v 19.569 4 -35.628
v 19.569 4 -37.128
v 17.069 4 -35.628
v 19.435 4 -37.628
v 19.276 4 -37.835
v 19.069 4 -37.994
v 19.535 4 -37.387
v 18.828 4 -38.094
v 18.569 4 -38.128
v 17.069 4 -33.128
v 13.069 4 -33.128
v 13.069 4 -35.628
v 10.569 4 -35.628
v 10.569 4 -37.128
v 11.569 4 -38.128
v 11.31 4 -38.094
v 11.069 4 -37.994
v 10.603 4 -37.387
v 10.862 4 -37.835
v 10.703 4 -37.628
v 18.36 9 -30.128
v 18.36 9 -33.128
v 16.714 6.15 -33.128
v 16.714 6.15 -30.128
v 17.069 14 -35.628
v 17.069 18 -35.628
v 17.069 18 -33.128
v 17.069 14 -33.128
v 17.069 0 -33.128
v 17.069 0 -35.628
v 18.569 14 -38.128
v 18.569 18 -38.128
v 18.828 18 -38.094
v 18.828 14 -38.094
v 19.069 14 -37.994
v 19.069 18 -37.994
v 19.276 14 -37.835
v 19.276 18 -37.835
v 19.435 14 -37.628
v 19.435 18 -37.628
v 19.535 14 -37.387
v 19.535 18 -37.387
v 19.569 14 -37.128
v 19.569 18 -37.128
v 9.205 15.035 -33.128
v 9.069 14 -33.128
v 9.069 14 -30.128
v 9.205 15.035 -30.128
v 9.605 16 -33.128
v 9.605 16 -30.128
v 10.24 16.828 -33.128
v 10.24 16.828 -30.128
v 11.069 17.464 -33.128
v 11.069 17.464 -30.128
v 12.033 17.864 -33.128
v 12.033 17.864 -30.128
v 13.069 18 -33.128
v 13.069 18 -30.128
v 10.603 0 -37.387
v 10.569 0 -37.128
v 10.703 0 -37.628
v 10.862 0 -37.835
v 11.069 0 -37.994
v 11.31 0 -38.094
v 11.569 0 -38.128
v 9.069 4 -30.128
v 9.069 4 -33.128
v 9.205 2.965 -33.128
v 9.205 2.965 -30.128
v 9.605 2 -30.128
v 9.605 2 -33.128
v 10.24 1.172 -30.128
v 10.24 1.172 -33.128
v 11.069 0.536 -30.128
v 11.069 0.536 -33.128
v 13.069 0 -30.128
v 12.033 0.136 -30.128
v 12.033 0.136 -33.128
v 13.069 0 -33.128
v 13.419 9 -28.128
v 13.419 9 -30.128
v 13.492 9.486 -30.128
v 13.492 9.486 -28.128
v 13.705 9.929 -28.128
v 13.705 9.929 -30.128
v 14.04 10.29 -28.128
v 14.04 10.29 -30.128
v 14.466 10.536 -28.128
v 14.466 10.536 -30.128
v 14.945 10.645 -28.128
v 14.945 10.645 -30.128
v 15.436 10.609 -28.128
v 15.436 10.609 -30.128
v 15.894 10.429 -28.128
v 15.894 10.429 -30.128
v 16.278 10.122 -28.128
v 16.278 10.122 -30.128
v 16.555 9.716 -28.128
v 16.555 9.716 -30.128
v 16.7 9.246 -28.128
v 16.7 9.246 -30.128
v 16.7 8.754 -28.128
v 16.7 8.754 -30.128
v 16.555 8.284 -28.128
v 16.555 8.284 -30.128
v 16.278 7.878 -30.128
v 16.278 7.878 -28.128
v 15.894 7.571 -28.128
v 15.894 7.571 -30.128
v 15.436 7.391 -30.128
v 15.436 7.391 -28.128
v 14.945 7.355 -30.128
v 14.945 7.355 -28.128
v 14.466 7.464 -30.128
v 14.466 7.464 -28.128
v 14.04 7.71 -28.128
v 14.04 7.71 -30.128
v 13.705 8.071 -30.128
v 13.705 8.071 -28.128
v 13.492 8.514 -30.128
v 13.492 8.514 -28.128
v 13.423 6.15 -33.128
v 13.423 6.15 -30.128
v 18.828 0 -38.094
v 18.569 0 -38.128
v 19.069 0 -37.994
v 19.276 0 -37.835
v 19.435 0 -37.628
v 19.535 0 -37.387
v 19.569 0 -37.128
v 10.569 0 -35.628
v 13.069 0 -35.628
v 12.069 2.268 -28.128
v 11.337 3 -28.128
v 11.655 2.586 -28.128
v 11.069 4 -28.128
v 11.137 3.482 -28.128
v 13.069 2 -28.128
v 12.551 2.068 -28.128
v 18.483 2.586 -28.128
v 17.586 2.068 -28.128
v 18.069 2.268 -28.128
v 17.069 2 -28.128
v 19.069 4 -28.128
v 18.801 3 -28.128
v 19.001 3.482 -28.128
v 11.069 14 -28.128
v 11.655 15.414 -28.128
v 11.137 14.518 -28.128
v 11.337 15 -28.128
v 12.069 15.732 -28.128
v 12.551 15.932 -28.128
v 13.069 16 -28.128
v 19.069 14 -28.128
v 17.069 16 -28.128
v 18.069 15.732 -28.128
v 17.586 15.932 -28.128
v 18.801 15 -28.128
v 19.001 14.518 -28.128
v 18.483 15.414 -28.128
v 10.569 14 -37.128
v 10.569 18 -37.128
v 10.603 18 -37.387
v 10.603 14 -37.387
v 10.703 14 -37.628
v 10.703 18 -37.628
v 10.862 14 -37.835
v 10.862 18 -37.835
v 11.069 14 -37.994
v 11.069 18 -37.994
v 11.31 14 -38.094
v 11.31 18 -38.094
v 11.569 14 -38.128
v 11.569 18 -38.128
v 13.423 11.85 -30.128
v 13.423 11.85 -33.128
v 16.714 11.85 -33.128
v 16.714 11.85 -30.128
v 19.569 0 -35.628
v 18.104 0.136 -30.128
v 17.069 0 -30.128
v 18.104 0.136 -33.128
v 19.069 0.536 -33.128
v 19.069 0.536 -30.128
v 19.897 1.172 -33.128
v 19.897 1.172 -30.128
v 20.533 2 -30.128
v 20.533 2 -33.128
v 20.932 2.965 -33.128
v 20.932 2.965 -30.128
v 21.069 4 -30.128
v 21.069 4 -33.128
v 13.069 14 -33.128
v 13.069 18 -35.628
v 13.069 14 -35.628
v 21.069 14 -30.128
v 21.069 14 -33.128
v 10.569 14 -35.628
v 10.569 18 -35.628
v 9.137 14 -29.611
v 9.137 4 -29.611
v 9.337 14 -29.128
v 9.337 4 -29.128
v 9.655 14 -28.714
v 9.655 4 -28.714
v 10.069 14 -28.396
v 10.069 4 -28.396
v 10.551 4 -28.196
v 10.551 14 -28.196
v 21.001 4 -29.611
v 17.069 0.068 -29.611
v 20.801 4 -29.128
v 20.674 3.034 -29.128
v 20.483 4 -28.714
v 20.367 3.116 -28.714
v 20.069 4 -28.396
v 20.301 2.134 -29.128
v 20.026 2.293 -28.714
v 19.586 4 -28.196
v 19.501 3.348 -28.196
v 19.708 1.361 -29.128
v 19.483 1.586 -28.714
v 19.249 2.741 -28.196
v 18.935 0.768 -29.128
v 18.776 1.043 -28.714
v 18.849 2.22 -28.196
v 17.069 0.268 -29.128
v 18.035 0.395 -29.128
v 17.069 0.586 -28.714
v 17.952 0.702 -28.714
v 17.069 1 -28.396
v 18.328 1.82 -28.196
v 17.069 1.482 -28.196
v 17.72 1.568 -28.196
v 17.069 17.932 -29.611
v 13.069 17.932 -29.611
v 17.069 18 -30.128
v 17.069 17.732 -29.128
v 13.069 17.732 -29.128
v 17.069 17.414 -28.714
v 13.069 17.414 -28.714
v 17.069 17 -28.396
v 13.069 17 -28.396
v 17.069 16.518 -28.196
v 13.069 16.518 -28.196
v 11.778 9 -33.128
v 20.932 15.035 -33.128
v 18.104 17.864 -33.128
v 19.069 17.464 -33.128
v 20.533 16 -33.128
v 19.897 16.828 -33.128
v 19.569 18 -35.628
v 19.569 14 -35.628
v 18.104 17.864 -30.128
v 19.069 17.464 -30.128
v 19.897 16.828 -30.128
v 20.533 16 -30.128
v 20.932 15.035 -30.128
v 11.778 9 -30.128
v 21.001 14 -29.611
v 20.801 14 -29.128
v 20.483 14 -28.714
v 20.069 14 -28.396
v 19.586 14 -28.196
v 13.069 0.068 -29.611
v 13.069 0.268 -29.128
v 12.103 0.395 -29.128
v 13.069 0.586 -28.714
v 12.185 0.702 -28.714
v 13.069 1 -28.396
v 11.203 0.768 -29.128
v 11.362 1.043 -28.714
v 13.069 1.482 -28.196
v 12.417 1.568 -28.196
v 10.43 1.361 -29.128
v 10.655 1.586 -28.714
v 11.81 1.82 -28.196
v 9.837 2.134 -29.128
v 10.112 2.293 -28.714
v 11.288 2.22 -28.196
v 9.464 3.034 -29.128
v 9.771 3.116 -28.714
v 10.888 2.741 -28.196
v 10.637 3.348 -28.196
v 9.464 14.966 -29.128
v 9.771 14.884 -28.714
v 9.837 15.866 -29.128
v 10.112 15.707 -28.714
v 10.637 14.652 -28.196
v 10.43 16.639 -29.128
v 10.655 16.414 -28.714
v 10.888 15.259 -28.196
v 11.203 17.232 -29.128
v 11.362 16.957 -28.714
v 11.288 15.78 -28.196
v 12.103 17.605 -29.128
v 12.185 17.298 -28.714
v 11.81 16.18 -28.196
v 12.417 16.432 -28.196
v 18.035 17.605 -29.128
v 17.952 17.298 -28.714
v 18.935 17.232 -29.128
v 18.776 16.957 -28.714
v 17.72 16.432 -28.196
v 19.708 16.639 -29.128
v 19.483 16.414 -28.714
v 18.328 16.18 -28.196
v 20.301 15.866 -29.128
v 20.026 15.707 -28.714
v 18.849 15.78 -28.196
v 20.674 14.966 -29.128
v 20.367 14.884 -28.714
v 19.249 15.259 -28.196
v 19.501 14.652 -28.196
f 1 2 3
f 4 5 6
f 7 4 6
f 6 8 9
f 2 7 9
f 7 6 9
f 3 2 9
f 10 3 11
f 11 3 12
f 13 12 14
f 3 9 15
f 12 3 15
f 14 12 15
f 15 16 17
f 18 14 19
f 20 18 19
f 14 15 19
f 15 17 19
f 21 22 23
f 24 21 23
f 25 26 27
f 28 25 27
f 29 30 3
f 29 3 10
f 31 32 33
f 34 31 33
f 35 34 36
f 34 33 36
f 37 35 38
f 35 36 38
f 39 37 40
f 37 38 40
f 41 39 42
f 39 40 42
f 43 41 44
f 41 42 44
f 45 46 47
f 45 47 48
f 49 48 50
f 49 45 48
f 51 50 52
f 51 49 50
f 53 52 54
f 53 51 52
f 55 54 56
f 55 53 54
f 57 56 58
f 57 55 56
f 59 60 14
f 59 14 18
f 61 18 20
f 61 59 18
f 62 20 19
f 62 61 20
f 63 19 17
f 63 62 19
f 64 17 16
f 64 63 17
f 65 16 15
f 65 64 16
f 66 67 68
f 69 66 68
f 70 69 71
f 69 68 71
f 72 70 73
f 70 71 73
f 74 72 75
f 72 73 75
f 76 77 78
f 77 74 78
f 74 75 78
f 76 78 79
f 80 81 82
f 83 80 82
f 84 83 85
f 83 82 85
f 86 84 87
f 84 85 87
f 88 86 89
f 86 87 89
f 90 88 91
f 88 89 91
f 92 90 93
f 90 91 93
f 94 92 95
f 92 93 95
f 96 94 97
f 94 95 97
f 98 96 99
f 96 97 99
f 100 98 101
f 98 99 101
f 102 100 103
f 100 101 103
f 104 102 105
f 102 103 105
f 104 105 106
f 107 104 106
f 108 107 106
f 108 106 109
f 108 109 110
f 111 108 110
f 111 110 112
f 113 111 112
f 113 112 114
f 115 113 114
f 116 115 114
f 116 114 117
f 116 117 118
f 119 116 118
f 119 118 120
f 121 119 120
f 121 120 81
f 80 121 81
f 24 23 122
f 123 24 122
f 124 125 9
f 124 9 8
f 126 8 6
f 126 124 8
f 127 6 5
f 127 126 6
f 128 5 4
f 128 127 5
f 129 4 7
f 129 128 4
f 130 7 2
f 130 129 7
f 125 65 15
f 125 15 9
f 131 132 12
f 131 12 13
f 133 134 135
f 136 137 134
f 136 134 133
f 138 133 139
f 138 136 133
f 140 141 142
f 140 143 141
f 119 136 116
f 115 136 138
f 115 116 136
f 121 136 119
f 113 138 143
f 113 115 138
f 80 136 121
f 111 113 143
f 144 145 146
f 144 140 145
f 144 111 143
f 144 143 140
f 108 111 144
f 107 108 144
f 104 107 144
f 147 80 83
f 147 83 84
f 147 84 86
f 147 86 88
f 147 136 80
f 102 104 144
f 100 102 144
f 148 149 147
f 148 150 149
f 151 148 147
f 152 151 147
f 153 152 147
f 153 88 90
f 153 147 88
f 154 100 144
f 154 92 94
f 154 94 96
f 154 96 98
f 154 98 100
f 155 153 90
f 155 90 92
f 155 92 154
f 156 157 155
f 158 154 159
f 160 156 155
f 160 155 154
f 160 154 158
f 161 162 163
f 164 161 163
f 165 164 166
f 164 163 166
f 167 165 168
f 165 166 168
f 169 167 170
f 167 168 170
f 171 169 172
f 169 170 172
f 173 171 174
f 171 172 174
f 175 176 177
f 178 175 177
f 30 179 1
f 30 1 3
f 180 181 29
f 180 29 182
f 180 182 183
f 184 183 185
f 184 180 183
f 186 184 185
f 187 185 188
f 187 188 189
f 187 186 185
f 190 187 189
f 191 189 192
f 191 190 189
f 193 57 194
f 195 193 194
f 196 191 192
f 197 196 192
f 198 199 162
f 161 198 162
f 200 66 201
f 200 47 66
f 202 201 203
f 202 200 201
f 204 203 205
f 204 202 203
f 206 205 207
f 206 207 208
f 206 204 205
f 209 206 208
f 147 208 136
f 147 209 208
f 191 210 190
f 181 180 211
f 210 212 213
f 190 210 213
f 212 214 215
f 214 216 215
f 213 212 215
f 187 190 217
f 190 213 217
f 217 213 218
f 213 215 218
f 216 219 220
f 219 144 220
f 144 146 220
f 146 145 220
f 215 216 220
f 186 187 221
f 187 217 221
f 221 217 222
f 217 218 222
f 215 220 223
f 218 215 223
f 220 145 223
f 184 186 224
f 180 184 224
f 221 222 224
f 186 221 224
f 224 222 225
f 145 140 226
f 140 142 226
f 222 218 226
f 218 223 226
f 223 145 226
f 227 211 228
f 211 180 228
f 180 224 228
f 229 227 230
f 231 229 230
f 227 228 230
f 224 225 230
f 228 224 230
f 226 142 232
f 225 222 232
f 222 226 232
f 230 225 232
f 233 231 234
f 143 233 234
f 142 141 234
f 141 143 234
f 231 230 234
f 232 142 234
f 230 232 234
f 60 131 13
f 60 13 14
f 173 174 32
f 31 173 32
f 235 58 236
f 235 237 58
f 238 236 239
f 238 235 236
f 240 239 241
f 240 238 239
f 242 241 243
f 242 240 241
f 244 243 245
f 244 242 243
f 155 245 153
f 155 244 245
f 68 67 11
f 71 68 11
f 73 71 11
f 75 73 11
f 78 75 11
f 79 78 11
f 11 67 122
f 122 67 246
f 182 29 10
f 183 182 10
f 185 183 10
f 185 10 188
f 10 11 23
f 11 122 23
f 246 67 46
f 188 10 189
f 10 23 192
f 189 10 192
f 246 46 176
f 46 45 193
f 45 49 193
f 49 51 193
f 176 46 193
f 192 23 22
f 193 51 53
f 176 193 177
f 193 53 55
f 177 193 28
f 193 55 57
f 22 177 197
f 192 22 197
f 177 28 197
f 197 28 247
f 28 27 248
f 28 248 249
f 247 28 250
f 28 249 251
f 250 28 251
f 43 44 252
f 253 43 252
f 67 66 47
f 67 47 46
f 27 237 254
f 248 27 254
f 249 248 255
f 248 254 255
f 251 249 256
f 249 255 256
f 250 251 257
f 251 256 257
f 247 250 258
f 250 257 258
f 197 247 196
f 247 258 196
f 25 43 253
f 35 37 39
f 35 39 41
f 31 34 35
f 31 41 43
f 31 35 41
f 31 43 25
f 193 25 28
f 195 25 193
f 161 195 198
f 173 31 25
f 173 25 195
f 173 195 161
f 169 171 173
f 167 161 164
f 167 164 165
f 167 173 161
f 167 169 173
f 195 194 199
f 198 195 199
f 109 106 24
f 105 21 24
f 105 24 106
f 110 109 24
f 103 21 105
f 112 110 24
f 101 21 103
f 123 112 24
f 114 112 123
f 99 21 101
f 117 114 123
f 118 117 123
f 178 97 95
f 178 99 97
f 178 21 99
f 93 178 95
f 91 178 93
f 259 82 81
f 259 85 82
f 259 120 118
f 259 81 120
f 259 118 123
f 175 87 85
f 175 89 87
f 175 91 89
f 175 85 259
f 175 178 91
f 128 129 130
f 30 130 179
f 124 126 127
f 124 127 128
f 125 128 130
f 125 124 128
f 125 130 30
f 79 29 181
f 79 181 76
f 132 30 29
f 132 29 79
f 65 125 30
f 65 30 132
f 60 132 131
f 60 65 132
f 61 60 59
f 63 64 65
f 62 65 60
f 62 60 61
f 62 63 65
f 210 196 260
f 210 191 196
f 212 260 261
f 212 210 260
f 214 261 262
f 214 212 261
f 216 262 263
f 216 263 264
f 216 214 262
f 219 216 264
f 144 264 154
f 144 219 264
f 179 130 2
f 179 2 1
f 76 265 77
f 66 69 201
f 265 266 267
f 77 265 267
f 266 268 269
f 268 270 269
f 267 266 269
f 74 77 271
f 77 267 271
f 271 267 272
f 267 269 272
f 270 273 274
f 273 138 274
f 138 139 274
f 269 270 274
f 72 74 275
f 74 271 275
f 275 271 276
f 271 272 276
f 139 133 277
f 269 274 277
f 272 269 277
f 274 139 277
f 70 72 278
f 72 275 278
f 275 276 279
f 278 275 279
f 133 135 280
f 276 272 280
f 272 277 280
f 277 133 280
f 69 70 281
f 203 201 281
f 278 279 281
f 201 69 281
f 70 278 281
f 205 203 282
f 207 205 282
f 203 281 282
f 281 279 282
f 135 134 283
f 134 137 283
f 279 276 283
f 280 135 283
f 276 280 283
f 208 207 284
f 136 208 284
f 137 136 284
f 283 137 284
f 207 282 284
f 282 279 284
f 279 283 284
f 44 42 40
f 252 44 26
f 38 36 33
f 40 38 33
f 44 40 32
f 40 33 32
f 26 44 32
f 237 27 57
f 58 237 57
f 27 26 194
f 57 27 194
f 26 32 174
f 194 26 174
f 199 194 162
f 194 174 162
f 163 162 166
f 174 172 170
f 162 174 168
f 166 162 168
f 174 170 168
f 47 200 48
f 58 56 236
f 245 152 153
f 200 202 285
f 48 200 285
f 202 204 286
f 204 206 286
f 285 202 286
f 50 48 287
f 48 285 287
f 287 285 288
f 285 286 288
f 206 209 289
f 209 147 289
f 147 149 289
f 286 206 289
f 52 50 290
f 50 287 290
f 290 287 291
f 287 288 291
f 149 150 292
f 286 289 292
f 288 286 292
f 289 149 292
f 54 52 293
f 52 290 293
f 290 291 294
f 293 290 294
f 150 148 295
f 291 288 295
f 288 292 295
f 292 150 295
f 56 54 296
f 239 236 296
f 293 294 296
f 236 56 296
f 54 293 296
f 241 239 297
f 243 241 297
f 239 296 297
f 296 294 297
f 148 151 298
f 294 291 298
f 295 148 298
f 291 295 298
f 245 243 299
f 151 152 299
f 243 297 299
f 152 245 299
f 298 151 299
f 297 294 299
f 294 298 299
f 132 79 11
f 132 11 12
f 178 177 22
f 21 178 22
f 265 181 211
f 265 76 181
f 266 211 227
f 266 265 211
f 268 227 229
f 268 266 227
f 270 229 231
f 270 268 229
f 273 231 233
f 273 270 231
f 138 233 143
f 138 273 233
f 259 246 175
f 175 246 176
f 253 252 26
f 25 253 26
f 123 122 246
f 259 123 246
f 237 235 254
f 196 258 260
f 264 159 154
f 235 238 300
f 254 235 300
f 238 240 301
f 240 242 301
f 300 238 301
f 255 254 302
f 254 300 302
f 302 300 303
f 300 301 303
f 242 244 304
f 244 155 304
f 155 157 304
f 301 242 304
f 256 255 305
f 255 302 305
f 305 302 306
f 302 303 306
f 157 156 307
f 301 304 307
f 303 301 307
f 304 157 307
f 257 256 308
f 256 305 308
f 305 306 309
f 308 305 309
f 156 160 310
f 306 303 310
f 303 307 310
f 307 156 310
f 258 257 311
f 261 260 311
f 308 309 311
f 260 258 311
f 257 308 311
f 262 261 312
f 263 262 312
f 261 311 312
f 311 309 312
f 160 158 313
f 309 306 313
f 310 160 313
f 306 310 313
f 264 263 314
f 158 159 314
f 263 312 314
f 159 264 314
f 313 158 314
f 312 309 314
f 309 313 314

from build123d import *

# Parameters (mm, degrees)
BOSS_EXTRU_3_DEPTH      = 4
ESQUISSE3_W             = 12
ESQUISSE3_H             = 5
BOSS_EXTRU_4_DEPTH      = 5
ENL_V_MAT_EXTRU_1_REACH = 7
ESQUISSE4_R             = 1.65
ENL_V_MAT_EXTRU_2_DEPTH = 3
CONG_1_R                = 4
CONG_2_R                = 2


with BuildPart() as part:
    # Esquisse2 → Boss.-Extru.3 (new body)
    with BuildSketch(Plane(origin=(0, 0, 0), x_dir=(1, 0, 0), z_dir=(0, 1, 0))):
        with BuildLine():
            Line((11.568725398, 38.128215269), (18.568725398, 38.128215269))
            ThreePointArc((18.568725398, 38.128215269), (19.275832179, 37.83532205), (19.568725398, 37.128215269))
            Line((19.568725398, 37.128215269), (19.568725398, 35.628215269))
            Line((19.568725398, 35.628215269), (17.068725398, 35.628215269))
            Line((17.068725398, 35.628215269), (17.068725398, 33.128215269))
            Line((17.068725398, 33.128215269), (21.068725398, 33.128215269))
            Line((21.068725398, 33.128215269), (21.068725398, 28.128215269))
            Line((21.068725398, 28.128215269), (9.068725398, 28.128215269))
            Line((9.068725398, 28.128215269), (9.068725398, 33.128215269))
            Line((9.068725398, 33.128215269), (13.068725398, 33.128215269))
            Line((13.068725398, 33.128215269), (13.068725398, 35.628215269))
            Line((13.068725398, 35.628215269), (10.568725398, 35.628215269))
            Line((10.568725398, 35.628215269), (10.568725398, 37.128215269))
            ThreePointArc((10.568725398, 37.128215269), (10.861618616, 37.83532205), (11.568725398, 38.128215269))
        make_face()
    extrude(amount=BOSS_EXTRU_3_DEPTH)

    # Esquisse3 → Boss.-Extru.4 (add)
    with BuildSketch(Plane(origin=(0, 4, 0), x_dir=(1, 0, 0), z_dir=(0, 1, 0))):
        with Locations((15.068725398, 30.628215269)):
            Rectangle(ESQUISSE3_W, ESQUISSE3_H)
    extrude(amount=BOSS_EXTRU_4_DEPTH)

    # Symétrie1: part across plane


with BuildPart() as part_1:
    add(part.part)
    add(part.part.mirror(Plane.ZX.offset(9)))

    # Esquisse4 → Enlèv. mat.-Extru.1 (cut, up to next)
    with BuildSketch(Plane(origin=(0, 0, -33.128215269), x_dir=(-1, 0, 0), z_dir=(0, 0, -1)), mode=Mode.PRIVATE) as enl_v_mat_extru_1_sk1:
        with Locations((-15.068725398, 9)):
            Circle(ESQUISSE4_R)
    enl_v_mat_extru_1_tool1 = extrude(enl_v_mat_extru_1_sk1.sketch, amount=-ENL_V_MAT_EXTRU_1_REACH, mode=Mode.PRIVATE) & part_1.part
    add(enl_v_mat_extru_1_tool1.solids().sort_by_distance((15.068725, 9, -33.128215))[0], mode=Mode.SUBTRACT)

    # Esquisse5 → Enlèv. mat.-Extru.2 (cut)
    with BuildSketch(Plane(origin=(0, 0, -33.128215269), x_dir=(-1, 0, 0), z_dir=(0, 0, -1))):
        Polygon((-13.42327713, 11.85), (-16.714173665, 11.85), (-18.359621932, 9), (-16.714173665, 6.15), (-13.42327713, 6.15), (-11.777828863, 9), align=None)
    extrude(amount=-ENL_V_MAT_EXTRU_2_DEPTH, mode=Mode.SUBTRACT)

    # Congé1
    cong_1_edges = [part_1.edges().sort_by_distance(p)[0] for p in [
        (9.068725398, 0, -30.628215269),
        (9.068725398, 18, -30.628215269),
        (21.068725398, 18, -30.628215269),
        (21.068725398, 0, -30.628215269),
    ]]
    fillet(cong_1_edges, radius=CONG_1_R)

    # Congé2
    cong_2_edges = [part_1.edges().sort_by_distance(p)[0] for p in [
        (9.068725398, 9, -28.128215269),
        (15.068725398, 0, -28.128215269),
        (21.068725398, 9, -28.128215269),
        (15.068725398, 18, -28.128215269),
        (19.897152522, 16.828427125, -28.128215269),
        (19.897152522, 1.171572875, -28.128215269),
        (10.240298273, 16.828427125, -28.128215269),
        (10.240298273, 1.171572875, -28.128215269),
    ]]
    fillet(cong_2_edges, radius=CONG_2_R)


solid = part_1.part
